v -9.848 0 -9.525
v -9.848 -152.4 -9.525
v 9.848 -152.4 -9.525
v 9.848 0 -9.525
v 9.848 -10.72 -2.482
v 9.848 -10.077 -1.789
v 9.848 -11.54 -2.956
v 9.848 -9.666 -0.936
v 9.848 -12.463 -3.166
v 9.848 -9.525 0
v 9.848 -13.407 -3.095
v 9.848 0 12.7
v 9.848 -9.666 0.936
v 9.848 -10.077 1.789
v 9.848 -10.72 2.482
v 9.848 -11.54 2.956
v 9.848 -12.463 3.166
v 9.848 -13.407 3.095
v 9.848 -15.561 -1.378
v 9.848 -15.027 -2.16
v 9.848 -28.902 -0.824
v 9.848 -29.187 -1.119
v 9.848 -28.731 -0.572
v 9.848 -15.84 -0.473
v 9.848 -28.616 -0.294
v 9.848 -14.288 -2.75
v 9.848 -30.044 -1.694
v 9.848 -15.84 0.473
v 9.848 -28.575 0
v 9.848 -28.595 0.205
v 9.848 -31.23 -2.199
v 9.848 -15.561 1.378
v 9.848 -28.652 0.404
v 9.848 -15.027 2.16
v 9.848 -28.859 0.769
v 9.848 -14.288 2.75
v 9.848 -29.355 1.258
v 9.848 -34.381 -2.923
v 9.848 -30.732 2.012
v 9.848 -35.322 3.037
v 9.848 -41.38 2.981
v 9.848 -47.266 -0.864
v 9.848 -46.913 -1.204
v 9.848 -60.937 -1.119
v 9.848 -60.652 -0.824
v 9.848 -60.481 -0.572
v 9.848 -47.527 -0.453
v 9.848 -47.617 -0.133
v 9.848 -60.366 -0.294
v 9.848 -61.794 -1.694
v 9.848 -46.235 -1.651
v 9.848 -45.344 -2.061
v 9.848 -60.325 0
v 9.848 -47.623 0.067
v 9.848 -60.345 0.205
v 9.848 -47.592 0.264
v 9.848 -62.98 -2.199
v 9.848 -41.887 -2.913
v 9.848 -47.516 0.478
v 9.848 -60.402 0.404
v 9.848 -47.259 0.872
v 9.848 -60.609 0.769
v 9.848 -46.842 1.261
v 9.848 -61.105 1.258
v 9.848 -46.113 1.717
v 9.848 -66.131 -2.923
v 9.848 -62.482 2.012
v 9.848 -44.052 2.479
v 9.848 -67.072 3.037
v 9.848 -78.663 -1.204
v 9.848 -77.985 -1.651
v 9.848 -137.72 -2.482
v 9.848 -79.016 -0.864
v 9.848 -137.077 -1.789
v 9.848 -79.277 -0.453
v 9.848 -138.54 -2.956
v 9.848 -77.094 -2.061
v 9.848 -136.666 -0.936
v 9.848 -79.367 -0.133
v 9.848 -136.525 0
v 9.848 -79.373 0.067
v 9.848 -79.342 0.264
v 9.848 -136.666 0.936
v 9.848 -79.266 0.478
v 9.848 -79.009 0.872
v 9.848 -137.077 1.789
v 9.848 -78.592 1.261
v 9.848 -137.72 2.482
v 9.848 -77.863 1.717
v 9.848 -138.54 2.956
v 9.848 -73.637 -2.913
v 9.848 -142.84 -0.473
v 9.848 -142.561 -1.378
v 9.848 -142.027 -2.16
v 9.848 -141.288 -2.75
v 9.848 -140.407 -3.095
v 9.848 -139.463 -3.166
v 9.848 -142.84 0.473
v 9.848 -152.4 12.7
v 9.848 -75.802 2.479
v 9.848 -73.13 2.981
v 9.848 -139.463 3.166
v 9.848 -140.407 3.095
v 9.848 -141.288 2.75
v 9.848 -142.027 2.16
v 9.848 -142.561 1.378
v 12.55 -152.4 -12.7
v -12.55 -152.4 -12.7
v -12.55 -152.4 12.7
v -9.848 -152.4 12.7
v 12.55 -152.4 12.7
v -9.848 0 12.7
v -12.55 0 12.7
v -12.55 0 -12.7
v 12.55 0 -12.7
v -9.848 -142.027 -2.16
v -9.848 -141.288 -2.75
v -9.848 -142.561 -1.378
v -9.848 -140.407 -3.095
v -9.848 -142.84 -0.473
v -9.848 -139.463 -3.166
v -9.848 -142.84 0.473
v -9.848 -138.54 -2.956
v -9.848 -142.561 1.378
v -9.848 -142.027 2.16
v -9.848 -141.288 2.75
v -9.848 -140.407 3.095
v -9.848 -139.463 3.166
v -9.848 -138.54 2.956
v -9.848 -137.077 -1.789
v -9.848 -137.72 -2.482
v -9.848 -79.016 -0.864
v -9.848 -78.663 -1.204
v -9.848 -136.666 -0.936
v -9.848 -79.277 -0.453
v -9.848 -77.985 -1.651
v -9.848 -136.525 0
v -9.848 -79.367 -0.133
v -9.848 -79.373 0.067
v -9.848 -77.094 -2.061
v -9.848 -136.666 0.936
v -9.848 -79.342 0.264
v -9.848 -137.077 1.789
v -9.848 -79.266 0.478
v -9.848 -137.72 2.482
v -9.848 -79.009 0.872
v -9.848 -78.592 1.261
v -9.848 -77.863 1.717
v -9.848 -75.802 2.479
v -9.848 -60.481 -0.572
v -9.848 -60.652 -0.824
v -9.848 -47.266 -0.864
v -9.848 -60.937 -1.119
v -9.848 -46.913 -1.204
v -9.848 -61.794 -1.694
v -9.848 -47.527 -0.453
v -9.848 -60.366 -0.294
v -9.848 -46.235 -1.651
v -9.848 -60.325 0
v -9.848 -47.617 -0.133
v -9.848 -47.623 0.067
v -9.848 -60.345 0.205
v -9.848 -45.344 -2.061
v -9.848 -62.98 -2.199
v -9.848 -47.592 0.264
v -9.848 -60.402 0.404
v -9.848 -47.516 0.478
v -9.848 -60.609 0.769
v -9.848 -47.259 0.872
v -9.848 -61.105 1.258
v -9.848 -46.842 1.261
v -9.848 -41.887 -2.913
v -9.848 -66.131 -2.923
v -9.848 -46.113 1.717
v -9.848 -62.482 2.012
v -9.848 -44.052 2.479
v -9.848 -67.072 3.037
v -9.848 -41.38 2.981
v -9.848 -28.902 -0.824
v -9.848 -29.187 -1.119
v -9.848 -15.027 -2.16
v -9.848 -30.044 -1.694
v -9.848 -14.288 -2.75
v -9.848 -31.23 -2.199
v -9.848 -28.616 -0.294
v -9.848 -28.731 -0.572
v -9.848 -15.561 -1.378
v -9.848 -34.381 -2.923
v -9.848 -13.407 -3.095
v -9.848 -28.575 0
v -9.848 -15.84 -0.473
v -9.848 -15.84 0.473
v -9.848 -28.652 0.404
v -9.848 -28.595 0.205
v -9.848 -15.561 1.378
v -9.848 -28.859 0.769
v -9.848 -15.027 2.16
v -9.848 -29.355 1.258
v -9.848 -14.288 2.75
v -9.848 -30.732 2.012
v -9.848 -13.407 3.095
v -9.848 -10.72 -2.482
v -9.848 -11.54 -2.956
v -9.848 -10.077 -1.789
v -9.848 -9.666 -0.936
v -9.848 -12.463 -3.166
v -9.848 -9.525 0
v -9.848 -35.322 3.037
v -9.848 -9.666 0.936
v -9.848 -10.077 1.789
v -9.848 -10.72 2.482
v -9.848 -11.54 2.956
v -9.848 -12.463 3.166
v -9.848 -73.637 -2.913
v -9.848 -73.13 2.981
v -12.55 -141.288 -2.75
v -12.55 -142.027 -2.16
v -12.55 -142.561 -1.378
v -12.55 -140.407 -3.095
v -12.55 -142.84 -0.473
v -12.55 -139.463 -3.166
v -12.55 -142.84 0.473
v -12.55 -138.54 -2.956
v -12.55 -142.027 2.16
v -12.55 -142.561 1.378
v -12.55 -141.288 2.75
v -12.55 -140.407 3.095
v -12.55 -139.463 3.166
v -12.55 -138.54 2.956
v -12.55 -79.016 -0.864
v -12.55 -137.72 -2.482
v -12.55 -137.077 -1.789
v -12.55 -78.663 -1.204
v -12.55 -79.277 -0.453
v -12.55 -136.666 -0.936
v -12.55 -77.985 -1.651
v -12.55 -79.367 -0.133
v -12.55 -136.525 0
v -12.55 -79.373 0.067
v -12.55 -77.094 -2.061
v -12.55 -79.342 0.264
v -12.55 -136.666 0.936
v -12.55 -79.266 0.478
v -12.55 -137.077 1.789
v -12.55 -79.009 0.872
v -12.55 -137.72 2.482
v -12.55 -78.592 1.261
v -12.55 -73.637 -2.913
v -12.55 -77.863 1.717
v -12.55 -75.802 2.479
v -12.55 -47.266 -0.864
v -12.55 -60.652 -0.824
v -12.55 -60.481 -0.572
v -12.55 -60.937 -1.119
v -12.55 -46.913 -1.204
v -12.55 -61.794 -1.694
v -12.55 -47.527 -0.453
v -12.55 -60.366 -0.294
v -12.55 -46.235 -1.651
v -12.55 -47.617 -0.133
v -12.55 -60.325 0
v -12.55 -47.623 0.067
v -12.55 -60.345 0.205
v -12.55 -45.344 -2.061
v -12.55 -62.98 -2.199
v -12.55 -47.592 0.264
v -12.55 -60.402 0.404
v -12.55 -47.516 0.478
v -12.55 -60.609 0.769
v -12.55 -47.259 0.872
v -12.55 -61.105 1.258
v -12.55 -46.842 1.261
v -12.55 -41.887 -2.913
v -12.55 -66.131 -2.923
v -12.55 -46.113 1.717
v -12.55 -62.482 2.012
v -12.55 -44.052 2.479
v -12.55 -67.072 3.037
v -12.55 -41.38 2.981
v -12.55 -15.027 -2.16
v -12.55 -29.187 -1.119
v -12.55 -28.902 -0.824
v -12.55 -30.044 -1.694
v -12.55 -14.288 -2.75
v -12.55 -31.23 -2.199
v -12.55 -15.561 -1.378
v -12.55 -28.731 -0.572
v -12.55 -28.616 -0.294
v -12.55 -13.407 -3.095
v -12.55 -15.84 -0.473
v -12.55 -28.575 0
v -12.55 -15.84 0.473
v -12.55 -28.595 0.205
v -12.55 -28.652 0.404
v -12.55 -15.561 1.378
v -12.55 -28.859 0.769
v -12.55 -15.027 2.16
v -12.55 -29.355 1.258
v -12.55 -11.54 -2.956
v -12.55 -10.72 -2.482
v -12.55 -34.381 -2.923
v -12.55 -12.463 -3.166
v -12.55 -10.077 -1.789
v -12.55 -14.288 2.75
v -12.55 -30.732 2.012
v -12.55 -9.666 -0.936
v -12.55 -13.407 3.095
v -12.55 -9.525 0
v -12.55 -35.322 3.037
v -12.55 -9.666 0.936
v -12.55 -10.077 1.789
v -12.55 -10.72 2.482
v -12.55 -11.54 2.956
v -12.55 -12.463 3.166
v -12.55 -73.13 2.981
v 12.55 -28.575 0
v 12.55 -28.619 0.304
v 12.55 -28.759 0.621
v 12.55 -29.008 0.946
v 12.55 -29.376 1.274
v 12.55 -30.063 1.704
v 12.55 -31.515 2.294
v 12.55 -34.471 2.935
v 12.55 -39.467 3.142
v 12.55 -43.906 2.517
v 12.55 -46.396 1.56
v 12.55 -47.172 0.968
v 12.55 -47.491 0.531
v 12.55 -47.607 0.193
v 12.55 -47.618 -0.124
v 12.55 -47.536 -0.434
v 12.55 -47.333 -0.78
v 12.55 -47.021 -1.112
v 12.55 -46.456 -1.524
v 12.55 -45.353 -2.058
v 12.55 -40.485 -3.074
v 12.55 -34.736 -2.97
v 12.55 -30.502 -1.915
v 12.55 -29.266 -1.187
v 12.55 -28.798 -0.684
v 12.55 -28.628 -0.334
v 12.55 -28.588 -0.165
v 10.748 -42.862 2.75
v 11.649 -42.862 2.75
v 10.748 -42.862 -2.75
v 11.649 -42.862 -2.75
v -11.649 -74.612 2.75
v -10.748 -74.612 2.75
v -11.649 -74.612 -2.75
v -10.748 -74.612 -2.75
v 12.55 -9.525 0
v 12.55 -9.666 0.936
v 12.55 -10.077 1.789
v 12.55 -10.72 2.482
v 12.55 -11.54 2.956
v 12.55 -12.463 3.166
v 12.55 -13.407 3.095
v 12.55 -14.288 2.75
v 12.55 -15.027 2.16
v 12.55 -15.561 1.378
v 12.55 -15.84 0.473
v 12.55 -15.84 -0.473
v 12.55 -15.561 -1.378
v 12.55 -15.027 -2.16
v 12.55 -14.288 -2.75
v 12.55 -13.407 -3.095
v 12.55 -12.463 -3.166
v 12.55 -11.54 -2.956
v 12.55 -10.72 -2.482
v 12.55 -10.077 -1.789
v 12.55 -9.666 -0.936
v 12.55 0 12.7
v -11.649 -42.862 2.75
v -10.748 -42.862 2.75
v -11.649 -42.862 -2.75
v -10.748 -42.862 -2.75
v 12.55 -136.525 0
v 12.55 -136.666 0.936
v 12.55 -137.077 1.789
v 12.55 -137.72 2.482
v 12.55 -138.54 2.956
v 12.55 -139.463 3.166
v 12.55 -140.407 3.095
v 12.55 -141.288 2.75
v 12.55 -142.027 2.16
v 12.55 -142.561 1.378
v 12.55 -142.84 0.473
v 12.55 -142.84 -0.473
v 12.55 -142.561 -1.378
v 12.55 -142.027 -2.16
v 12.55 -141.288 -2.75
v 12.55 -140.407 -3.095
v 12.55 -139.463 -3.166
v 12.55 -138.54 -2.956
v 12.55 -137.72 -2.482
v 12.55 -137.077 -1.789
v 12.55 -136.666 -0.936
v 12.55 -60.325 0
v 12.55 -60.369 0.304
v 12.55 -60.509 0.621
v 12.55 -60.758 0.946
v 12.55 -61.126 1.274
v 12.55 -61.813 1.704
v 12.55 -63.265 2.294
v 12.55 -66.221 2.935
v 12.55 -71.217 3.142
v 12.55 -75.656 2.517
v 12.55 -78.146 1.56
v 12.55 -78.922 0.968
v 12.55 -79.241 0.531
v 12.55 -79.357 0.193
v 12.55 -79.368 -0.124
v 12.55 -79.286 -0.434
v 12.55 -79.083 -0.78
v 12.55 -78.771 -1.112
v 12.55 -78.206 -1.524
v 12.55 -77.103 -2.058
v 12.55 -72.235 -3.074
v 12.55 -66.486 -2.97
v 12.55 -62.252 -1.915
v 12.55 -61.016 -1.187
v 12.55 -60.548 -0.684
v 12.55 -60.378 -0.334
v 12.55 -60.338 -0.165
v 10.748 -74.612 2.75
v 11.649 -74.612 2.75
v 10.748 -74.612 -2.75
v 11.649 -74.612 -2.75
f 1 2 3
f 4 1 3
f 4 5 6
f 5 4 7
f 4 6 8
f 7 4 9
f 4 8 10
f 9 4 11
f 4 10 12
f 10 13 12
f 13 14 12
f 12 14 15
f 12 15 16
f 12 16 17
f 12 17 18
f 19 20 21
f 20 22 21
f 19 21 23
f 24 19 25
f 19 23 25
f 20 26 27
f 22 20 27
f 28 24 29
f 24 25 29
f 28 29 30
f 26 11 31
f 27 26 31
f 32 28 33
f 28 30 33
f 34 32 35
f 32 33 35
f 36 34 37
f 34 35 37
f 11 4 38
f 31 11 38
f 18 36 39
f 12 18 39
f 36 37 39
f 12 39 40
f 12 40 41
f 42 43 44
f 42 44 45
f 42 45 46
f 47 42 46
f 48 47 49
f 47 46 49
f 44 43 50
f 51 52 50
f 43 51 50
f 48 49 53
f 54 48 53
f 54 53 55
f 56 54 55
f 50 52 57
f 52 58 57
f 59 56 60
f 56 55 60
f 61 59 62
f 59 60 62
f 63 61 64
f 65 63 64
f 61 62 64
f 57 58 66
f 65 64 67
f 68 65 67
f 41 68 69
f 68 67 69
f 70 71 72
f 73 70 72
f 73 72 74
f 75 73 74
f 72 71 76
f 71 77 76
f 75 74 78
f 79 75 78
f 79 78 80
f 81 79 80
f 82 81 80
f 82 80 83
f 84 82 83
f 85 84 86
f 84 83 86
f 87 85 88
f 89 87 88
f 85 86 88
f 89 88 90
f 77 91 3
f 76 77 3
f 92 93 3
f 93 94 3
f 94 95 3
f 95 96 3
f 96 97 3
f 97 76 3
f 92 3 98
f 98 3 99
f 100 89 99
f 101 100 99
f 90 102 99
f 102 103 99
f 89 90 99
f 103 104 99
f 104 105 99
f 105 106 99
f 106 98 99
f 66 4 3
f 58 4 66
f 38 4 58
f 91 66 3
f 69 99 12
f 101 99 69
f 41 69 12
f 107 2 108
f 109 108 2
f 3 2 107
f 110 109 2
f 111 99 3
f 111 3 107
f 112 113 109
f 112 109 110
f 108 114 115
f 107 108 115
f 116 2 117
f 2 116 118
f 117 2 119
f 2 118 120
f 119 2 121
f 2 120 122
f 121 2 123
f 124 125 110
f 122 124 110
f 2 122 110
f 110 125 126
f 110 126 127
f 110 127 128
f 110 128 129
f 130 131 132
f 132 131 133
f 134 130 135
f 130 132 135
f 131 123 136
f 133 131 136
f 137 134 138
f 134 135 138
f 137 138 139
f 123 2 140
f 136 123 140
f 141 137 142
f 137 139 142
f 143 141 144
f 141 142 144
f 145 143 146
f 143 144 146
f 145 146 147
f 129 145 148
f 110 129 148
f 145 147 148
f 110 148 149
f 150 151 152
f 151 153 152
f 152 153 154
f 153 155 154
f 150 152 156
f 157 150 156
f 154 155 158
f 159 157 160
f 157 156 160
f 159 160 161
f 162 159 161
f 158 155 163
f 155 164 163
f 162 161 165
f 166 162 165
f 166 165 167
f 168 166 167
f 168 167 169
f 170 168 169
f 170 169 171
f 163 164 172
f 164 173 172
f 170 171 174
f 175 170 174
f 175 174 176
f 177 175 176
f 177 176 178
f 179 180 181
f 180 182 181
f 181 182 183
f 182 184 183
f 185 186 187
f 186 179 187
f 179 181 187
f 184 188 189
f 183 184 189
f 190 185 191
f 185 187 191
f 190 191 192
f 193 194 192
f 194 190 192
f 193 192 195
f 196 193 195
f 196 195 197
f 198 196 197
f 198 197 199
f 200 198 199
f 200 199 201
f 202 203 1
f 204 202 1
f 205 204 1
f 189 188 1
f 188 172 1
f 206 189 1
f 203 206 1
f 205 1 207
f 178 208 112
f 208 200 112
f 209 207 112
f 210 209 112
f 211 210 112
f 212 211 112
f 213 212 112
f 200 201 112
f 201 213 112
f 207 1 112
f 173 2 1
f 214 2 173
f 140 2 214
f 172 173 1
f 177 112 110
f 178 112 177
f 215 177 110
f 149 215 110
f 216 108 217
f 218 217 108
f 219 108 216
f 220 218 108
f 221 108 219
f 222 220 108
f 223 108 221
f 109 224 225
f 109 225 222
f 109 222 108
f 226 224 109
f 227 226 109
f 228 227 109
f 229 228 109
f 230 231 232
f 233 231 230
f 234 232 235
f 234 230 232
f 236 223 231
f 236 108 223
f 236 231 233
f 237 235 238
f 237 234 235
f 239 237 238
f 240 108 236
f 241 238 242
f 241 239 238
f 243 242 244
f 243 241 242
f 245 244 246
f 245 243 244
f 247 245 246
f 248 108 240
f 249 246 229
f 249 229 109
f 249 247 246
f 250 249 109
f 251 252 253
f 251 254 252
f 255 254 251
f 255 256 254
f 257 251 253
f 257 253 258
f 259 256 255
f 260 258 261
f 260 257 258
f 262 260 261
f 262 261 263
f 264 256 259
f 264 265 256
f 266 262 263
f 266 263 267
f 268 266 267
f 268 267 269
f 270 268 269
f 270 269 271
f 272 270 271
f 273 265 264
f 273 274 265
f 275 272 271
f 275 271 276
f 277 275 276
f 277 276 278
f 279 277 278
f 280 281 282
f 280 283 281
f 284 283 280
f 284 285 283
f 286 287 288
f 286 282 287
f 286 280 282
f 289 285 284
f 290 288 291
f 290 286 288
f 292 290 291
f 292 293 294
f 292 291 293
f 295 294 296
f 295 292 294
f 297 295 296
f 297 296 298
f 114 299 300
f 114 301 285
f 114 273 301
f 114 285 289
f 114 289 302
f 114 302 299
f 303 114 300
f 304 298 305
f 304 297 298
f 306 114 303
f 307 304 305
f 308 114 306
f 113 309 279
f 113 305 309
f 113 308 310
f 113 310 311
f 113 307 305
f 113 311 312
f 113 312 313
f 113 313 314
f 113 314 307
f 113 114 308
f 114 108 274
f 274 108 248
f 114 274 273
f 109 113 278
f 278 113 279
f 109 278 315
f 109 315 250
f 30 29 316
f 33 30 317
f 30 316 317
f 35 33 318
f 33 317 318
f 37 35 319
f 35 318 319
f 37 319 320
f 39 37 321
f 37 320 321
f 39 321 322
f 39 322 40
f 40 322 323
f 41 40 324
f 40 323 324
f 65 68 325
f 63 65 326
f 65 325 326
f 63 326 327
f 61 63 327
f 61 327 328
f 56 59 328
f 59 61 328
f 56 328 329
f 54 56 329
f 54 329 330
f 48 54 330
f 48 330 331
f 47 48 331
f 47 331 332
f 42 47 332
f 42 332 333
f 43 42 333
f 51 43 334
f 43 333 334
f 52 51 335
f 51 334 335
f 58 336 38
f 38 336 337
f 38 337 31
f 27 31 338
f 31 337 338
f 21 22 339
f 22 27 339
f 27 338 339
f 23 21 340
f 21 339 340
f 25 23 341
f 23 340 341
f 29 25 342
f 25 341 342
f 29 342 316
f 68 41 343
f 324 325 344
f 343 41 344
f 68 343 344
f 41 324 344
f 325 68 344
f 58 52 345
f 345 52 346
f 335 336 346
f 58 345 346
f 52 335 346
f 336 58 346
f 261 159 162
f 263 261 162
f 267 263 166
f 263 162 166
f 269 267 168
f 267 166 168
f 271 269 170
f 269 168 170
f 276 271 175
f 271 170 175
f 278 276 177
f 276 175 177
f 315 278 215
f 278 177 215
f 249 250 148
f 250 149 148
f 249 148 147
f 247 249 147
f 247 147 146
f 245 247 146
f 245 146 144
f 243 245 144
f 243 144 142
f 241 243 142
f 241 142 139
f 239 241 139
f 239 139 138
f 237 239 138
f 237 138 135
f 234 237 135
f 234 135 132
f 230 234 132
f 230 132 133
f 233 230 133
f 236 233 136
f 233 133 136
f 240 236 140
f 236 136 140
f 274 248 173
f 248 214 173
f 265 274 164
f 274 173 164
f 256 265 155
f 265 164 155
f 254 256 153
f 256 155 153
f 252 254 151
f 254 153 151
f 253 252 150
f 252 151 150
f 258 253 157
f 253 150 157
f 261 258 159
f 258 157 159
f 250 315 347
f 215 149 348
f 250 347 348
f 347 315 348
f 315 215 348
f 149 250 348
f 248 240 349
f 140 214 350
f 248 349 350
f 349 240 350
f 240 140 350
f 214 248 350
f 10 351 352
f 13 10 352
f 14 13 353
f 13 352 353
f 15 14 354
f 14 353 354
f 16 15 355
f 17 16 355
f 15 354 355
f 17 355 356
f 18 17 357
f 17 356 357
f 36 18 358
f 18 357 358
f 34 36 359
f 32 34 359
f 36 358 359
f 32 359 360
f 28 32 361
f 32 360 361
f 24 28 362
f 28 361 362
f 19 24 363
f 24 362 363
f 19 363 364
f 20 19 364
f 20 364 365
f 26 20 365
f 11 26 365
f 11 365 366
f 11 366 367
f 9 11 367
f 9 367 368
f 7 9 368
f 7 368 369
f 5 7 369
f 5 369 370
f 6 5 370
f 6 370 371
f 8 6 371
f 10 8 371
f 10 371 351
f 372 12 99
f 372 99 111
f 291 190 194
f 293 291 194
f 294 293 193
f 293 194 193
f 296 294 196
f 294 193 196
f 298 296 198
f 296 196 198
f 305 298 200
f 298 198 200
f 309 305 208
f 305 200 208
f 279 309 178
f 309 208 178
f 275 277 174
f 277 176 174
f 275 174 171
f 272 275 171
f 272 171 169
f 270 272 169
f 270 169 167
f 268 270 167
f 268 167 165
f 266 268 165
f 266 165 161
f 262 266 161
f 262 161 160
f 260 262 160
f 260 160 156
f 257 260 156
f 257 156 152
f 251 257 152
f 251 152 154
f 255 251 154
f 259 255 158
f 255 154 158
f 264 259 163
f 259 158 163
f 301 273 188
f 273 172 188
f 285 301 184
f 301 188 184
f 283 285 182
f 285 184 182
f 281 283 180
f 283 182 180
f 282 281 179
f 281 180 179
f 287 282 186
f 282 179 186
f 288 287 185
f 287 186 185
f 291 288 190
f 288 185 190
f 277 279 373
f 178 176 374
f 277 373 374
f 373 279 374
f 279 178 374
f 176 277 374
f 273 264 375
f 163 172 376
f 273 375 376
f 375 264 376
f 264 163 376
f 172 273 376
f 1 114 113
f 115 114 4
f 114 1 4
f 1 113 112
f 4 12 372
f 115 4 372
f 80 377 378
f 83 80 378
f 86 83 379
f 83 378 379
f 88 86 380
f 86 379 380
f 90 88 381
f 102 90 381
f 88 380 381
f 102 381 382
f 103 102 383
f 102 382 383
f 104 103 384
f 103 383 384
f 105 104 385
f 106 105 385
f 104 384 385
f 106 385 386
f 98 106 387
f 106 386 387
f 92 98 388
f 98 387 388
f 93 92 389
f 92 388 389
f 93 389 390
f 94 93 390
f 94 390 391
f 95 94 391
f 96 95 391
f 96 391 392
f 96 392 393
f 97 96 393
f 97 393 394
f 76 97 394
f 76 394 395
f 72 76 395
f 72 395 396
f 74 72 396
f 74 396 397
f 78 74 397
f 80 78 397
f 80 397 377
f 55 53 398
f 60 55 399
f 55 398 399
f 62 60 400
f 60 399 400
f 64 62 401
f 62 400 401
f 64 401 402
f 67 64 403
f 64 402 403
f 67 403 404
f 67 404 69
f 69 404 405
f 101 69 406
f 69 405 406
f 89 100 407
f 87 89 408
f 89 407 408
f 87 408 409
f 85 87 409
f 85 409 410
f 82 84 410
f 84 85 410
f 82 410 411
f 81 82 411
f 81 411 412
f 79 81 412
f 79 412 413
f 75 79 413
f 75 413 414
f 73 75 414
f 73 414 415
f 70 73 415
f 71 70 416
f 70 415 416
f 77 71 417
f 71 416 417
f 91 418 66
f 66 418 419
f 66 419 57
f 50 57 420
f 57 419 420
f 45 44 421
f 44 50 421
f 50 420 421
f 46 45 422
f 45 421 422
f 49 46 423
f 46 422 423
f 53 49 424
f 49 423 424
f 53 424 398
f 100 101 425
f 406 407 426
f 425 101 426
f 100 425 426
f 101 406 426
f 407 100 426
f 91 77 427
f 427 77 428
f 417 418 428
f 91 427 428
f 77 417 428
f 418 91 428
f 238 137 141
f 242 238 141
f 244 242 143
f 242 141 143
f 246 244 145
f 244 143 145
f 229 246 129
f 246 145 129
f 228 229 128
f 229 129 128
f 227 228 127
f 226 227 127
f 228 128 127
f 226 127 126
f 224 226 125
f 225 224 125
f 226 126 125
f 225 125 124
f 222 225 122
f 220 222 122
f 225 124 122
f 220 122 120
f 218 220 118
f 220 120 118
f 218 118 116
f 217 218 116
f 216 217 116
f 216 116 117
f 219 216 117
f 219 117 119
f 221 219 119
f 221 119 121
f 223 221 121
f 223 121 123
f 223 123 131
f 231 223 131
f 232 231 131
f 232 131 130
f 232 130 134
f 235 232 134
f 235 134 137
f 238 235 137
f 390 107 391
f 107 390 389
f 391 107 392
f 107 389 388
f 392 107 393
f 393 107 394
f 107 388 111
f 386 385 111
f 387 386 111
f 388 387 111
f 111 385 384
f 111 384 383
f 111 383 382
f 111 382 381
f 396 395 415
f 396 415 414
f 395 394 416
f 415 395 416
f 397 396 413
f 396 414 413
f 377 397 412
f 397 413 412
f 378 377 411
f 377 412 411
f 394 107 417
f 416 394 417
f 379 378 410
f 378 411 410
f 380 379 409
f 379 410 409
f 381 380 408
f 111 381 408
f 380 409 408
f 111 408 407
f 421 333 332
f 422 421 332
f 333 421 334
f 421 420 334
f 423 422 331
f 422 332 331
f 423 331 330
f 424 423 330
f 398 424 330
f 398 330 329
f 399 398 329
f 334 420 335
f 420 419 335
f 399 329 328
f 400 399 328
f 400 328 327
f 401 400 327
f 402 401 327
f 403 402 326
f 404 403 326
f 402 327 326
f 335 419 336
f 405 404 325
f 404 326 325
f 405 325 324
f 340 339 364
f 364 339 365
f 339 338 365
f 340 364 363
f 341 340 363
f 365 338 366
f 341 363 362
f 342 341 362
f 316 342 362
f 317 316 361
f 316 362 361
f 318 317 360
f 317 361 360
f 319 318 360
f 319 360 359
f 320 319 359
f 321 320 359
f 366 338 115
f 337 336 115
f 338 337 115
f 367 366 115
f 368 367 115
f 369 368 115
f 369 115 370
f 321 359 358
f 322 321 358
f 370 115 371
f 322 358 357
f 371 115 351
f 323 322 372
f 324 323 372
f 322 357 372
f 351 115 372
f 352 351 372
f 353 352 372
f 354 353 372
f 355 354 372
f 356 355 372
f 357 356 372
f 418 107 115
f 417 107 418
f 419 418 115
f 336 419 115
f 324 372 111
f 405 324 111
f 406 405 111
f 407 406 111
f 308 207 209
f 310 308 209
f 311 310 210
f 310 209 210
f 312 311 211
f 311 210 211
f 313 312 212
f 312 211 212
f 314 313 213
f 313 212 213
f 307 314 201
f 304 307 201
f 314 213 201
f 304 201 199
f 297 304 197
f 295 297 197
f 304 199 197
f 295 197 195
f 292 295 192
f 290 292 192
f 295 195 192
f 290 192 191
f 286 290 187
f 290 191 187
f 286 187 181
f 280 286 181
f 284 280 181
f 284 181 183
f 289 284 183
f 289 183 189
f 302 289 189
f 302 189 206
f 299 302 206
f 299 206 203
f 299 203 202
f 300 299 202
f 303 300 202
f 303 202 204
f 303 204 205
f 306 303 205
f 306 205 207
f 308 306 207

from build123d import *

# Parameters (mm, degrees)
F0_W     = 25.099074
F0_H     = 25.4
F1_DEPTH = 152.4
F2_W     = 19.695762
F2_H     = 19.05
F3_DEPTH = 203.2
F4_R     = 3.175
F5_DEPTH = 25.4
F6_W     = 19.695762
F6_H     = 3.175
F7_DEPTH = 203.2
F8_R     = 3.175
F9_DEPTH = 25.100073


with BuildPart() as f1:
    # F0 (on Front) → F1 (new body)
    with BuildSketch(Plane.XZ):
        Rectangle(F0_W, F0_H)
    extrude(amount=F1_DEPTH)

    # F2 (on face) → F3 (cut)
    with BuildSketch(Plane.XZ.offset(152.4)):
        Rectangle(F2_W, F2_H)
    extrude(amount=-F3_DEPTH, mode=Mode.SUBTRACT)

    # F4 (on face) → F5 (cut)
    with BuildSketch(Plane.YZ.offset(12.549537)):
        with Locations((-139.7, 0)):
            Circle(F4_R)
    extrude(amount=-F5_DEPTH, mode=Mode.SUBTRACT)

    # F6 (on face) → F7 (cut)
    with BuildSketch(Plane(origin=(0, 0, 0), x_dir=(-1, 0, 0), z_dir=(0, 1, 0))):
        with Locations((0, 11.1125)):
            Rectangle(F6_W, F6_H)
    extrude(amount=-F7_DEPTH, mode=Mode.SUBTRACT)

    # F8 (on face) → F9 (cut, through all)
    with BuildSketch(Plane.YZ.offset(12.549537)):
        with Locations((-12.7, 0)):
            Circle(F8_R)
        with BuildLine():
            add(Edge.make_bspline(
                [(-60.325, 0), (-60.325, 5.499261), (-74.6125, 2.749631), (-88.9, 0), (-74.6125, -2.749631), (-60.325, -5.499261), (-60.325, 0)],
                knots=[0, 0, 0, 2.094395, 2.094395, 4.18879, 4.18879, 6.283185, 6.283185, 6.283185], degree=2, weights=[1, 0.5, 1, 0.5, 1, 0.5, 1]))
        make_face()
        with BuildLine():
            add(Edge.make_bspline(
                [(-28.575, 0), (-28.575, 5.499261), (-42.8625, 2.749631), (-57.15, 0), (-42.8625, -2.749631), (-28.575, -5.499261), (-28.575, 0)],
                knots=[0, 0, 0, 2.094395, 2.094395, 4.18879, 4.18879, 6.283185, 6.283185, 6.283185], degree=2, weights=[1, 0.5, 1, 0.5, 1, 0.5, 1]))
        make_face()
    extrude(amount=-F9_DEPTH, mode=Mode.SUBTRACT)


solid = f1.part
